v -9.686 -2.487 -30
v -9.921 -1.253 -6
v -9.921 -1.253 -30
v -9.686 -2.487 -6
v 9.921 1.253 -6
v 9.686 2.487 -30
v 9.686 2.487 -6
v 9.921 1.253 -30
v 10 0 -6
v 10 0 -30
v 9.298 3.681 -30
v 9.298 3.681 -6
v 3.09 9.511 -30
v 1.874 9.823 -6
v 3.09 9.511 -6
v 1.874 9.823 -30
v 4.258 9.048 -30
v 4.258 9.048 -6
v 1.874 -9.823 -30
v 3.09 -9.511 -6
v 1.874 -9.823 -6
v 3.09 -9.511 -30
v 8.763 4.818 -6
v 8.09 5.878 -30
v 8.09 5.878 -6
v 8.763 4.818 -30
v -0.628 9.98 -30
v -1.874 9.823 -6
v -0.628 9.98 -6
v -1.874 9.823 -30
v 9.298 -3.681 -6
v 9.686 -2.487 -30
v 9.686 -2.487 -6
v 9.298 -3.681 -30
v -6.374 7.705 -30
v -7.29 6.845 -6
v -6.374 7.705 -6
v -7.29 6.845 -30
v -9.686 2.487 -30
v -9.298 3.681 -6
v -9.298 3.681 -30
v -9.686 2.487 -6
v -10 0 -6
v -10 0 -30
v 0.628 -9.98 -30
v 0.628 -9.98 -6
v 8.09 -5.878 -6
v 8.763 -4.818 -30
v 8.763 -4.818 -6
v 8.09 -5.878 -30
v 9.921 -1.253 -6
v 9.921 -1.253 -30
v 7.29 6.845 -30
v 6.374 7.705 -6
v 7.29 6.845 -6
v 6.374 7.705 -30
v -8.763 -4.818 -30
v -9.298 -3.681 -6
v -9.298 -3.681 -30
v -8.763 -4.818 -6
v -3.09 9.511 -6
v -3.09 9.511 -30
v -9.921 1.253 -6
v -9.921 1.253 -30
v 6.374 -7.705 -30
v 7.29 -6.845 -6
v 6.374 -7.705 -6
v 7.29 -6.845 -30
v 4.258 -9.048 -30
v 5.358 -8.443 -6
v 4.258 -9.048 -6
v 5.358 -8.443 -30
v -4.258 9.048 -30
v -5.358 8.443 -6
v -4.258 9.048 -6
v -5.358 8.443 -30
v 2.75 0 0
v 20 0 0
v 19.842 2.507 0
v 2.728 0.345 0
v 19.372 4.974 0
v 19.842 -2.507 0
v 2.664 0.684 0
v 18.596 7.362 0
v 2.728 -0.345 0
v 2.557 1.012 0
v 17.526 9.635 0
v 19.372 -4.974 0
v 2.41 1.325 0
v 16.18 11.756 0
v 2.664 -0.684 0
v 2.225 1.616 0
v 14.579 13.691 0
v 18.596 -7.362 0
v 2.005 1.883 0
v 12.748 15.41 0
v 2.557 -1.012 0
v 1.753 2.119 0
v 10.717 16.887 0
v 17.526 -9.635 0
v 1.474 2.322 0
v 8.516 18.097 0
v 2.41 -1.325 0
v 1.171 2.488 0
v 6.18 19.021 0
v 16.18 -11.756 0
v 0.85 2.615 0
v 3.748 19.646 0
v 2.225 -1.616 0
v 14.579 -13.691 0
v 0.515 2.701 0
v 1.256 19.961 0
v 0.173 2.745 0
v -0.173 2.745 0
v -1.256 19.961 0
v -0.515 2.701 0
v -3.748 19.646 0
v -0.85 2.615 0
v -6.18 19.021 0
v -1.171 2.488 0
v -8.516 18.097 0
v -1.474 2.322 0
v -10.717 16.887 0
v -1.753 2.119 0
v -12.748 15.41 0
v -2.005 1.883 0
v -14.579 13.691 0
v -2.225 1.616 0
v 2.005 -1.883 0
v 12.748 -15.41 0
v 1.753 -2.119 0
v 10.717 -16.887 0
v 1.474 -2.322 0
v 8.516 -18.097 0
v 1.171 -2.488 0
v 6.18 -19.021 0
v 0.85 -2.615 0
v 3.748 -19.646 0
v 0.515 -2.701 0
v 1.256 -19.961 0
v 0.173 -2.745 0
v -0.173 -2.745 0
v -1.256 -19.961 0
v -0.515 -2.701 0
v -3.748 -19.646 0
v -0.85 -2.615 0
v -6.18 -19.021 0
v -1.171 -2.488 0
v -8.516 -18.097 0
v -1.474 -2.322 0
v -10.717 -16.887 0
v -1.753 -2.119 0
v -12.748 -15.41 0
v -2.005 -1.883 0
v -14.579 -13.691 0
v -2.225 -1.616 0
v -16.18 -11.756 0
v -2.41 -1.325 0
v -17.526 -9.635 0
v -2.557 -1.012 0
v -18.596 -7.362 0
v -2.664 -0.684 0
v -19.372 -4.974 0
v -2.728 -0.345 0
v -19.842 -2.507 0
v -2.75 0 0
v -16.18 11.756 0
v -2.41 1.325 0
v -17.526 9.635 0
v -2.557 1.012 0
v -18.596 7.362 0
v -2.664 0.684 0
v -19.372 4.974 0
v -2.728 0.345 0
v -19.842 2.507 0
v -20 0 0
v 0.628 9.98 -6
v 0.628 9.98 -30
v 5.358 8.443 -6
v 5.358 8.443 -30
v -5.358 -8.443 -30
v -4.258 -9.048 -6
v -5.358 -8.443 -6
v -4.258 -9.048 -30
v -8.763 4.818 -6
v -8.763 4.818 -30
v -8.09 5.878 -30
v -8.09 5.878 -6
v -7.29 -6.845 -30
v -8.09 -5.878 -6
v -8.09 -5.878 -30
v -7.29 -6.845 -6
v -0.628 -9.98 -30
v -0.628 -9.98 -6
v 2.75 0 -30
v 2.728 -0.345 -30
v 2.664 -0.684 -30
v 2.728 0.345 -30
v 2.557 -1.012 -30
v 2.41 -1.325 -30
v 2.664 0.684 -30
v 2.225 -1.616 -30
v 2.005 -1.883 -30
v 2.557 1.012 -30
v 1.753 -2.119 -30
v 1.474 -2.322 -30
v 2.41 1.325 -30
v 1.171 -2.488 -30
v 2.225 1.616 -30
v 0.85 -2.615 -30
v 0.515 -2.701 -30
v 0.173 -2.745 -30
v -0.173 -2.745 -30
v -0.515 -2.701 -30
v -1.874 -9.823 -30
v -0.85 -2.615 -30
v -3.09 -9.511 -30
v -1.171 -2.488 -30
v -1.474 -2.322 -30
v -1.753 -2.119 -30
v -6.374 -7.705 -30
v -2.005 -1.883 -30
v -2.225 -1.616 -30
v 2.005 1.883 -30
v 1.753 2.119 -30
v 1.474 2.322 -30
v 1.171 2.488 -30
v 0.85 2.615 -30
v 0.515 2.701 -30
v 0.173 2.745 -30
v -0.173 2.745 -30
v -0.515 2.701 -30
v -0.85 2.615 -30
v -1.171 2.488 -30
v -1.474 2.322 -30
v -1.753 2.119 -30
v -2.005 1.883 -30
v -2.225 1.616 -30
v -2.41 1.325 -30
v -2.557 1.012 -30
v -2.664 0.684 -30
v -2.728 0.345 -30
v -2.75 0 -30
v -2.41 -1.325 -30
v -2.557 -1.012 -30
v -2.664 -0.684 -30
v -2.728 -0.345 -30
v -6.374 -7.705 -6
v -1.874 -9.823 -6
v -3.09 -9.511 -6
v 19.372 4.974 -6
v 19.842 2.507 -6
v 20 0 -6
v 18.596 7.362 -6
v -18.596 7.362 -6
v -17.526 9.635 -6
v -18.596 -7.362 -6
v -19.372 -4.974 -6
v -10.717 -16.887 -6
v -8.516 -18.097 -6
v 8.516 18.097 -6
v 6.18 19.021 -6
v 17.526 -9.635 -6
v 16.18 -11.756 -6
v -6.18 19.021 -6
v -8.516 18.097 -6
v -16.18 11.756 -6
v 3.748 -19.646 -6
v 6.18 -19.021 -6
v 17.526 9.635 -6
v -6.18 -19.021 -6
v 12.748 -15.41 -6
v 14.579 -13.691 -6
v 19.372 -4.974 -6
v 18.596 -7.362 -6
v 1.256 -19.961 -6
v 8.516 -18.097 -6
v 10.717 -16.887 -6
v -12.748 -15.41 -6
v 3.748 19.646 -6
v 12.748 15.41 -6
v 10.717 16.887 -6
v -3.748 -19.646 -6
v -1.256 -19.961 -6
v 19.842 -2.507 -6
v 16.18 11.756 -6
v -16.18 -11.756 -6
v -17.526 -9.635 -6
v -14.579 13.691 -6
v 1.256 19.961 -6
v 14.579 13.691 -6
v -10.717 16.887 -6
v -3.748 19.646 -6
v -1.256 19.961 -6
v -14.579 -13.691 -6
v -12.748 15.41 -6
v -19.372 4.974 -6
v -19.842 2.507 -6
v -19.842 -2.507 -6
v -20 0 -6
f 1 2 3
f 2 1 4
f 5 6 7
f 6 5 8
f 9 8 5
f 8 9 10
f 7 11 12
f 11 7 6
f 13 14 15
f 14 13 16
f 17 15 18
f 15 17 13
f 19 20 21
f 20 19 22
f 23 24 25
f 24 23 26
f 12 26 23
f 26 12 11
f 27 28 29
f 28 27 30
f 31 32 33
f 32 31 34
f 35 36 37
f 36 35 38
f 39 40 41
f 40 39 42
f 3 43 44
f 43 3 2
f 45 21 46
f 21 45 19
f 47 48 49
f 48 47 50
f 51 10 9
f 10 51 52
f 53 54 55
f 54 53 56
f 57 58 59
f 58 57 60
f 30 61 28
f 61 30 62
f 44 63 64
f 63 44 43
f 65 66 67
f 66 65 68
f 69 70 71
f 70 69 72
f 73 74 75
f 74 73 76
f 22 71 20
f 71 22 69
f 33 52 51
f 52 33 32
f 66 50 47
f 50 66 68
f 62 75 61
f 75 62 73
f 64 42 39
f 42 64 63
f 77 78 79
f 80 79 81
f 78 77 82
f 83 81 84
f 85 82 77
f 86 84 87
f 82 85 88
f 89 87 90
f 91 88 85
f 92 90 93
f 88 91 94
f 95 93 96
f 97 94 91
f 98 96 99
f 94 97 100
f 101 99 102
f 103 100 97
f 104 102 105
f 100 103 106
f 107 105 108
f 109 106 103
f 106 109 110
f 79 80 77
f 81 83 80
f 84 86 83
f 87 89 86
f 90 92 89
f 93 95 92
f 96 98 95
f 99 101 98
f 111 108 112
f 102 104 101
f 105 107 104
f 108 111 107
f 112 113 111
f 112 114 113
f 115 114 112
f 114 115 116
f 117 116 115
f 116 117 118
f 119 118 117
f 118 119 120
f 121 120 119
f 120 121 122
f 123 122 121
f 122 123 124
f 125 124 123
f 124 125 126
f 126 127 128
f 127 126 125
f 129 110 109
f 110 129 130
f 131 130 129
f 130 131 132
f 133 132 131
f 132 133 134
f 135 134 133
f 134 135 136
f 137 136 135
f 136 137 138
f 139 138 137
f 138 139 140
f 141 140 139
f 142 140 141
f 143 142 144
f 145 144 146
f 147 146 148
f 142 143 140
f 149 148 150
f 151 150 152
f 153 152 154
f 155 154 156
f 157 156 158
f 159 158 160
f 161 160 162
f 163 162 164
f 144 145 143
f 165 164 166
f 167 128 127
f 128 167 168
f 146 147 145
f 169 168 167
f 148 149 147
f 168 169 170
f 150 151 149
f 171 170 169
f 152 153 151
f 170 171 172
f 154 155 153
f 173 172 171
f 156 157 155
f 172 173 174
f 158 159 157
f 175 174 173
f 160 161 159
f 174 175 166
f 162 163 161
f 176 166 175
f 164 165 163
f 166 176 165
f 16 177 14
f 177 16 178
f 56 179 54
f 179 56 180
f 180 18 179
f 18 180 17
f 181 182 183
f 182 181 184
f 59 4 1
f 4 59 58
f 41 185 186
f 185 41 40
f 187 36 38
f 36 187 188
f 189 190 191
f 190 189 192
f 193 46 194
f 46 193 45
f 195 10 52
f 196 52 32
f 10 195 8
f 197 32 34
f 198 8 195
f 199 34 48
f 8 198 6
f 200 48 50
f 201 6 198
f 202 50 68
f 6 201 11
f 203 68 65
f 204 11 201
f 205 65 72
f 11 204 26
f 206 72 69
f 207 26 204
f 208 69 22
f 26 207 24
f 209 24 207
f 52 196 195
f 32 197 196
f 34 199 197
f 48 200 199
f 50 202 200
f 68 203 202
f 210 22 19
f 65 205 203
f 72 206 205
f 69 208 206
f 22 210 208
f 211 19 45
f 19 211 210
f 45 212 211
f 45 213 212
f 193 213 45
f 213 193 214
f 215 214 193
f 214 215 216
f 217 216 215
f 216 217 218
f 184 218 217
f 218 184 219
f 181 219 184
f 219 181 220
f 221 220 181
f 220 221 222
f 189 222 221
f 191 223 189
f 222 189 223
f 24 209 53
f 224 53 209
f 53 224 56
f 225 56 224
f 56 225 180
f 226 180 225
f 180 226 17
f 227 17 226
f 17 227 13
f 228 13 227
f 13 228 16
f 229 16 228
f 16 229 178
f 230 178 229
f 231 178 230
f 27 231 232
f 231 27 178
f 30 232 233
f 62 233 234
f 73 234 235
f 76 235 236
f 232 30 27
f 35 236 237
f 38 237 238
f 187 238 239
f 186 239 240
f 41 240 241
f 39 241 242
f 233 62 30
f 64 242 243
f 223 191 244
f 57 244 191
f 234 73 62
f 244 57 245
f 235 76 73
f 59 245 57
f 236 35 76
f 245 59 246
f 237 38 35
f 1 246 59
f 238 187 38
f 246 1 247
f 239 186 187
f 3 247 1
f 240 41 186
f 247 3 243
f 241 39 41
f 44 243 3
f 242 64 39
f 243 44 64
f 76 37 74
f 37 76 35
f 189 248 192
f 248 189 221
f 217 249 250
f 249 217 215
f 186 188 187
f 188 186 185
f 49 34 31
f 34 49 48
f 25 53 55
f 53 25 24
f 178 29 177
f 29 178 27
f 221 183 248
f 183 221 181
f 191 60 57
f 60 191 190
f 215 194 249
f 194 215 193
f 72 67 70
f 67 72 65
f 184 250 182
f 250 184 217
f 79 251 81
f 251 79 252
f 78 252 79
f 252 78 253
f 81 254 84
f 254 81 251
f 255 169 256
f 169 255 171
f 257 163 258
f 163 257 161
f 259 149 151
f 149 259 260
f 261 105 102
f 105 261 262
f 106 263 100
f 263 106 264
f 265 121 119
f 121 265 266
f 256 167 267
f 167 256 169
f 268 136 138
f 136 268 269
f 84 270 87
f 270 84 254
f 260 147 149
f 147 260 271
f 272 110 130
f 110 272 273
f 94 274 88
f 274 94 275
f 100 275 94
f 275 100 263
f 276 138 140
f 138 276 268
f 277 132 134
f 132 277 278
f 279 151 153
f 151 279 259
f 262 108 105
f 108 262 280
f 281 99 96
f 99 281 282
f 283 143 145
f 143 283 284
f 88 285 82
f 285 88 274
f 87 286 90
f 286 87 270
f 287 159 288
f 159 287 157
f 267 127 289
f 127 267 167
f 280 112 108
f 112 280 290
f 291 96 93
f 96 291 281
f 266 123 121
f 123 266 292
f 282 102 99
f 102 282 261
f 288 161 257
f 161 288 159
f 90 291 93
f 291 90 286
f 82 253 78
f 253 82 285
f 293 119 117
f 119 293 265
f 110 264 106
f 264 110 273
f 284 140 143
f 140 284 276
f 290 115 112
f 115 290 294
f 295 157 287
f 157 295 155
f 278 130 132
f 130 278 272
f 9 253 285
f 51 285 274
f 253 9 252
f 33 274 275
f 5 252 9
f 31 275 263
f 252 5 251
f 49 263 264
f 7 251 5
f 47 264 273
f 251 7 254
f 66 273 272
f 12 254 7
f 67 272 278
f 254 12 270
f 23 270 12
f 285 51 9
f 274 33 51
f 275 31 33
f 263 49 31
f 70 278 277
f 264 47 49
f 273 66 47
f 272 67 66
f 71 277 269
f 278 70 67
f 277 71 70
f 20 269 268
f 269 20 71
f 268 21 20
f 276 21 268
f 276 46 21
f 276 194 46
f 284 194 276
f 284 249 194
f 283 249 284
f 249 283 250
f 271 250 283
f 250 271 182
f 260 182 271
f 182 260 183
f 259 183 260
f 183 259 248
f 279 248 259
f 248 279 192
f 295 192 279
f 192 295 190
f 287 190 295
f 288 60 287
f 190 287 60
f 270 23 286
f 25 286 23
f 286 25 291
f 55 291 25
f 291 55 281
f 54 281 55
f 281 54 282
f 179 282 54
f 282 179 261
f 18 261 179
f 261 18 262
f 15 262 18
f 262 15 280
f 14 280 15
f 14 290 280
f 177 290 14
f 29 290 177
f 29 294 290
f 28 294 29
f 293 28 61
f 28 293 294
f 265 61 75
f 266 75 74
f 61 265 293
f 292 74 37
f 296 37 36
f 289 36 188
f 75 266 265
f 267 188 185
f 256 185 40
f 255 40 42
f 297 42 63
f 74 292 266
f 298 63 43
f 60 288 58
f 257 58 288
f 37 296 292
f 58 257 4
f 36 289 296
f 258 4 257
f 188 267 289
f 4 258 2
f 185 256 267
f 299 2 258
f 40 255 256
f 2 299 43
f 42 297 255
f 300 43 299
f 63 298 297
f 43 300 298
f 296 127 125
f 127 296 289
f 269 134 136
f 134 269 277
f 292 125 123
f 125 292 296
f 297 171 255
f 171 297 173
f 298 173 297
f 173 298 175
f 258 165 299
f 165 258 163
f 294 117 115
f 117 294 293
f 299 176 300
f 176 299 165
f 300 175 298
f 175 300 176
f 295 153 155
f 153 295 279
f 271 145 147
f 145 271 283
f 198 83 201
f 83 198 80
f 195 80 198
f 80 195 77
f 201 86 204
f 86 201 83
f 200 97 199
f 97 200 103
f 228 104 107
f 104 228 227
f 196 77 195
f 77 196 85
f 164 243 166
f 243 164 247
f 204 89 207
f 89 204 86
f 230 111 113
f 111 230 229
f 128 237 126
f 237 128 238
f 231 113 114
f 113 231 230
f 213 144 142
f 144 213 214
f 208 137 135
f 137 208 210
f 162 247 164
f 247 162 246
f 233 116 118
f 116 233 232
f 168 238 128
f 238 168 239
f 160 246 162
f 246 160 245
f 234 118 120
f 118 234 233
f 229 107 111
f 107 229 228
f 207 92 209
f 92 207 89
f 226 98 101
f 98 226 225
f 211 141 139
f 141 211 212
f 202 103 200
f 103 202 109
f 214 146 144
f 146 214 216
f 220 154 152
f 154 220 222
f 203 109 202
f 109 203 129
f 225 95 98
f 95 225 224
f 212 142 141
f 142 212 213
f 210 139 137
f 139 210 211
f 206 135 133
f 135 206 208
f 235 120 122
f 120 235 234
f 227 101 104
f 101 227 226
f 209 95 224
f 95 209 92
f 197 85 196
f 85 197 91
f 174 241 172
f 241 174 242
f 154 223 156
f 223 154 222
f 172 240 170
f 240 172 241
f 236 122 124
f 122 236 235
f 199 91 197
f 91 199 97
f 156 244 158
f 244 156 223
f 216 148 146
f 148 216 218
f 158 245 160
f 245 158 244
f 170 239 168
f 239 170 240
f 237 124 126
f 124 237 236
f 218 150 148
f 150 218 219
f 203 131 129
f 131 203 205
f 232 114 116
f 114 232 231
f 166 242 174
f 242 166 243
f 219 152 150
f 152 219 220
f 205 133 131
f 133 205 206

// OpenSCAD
$fn = 50;


difference() {
	union() {
		translate(v = [0, 0, -30.0000000000]) {
			cylinder(h = 30, r = 10.0000000000);
		}
		translate(v = [0, 0, -6.0000000000]) {
			cylinder(h = 6, r = 20.0000000000);
		}
	}
	union() {
		#translate(v = [0, 0, -30]) {
			cylinder(h = 30, r = 2.7500000000);
		}
	}
}
